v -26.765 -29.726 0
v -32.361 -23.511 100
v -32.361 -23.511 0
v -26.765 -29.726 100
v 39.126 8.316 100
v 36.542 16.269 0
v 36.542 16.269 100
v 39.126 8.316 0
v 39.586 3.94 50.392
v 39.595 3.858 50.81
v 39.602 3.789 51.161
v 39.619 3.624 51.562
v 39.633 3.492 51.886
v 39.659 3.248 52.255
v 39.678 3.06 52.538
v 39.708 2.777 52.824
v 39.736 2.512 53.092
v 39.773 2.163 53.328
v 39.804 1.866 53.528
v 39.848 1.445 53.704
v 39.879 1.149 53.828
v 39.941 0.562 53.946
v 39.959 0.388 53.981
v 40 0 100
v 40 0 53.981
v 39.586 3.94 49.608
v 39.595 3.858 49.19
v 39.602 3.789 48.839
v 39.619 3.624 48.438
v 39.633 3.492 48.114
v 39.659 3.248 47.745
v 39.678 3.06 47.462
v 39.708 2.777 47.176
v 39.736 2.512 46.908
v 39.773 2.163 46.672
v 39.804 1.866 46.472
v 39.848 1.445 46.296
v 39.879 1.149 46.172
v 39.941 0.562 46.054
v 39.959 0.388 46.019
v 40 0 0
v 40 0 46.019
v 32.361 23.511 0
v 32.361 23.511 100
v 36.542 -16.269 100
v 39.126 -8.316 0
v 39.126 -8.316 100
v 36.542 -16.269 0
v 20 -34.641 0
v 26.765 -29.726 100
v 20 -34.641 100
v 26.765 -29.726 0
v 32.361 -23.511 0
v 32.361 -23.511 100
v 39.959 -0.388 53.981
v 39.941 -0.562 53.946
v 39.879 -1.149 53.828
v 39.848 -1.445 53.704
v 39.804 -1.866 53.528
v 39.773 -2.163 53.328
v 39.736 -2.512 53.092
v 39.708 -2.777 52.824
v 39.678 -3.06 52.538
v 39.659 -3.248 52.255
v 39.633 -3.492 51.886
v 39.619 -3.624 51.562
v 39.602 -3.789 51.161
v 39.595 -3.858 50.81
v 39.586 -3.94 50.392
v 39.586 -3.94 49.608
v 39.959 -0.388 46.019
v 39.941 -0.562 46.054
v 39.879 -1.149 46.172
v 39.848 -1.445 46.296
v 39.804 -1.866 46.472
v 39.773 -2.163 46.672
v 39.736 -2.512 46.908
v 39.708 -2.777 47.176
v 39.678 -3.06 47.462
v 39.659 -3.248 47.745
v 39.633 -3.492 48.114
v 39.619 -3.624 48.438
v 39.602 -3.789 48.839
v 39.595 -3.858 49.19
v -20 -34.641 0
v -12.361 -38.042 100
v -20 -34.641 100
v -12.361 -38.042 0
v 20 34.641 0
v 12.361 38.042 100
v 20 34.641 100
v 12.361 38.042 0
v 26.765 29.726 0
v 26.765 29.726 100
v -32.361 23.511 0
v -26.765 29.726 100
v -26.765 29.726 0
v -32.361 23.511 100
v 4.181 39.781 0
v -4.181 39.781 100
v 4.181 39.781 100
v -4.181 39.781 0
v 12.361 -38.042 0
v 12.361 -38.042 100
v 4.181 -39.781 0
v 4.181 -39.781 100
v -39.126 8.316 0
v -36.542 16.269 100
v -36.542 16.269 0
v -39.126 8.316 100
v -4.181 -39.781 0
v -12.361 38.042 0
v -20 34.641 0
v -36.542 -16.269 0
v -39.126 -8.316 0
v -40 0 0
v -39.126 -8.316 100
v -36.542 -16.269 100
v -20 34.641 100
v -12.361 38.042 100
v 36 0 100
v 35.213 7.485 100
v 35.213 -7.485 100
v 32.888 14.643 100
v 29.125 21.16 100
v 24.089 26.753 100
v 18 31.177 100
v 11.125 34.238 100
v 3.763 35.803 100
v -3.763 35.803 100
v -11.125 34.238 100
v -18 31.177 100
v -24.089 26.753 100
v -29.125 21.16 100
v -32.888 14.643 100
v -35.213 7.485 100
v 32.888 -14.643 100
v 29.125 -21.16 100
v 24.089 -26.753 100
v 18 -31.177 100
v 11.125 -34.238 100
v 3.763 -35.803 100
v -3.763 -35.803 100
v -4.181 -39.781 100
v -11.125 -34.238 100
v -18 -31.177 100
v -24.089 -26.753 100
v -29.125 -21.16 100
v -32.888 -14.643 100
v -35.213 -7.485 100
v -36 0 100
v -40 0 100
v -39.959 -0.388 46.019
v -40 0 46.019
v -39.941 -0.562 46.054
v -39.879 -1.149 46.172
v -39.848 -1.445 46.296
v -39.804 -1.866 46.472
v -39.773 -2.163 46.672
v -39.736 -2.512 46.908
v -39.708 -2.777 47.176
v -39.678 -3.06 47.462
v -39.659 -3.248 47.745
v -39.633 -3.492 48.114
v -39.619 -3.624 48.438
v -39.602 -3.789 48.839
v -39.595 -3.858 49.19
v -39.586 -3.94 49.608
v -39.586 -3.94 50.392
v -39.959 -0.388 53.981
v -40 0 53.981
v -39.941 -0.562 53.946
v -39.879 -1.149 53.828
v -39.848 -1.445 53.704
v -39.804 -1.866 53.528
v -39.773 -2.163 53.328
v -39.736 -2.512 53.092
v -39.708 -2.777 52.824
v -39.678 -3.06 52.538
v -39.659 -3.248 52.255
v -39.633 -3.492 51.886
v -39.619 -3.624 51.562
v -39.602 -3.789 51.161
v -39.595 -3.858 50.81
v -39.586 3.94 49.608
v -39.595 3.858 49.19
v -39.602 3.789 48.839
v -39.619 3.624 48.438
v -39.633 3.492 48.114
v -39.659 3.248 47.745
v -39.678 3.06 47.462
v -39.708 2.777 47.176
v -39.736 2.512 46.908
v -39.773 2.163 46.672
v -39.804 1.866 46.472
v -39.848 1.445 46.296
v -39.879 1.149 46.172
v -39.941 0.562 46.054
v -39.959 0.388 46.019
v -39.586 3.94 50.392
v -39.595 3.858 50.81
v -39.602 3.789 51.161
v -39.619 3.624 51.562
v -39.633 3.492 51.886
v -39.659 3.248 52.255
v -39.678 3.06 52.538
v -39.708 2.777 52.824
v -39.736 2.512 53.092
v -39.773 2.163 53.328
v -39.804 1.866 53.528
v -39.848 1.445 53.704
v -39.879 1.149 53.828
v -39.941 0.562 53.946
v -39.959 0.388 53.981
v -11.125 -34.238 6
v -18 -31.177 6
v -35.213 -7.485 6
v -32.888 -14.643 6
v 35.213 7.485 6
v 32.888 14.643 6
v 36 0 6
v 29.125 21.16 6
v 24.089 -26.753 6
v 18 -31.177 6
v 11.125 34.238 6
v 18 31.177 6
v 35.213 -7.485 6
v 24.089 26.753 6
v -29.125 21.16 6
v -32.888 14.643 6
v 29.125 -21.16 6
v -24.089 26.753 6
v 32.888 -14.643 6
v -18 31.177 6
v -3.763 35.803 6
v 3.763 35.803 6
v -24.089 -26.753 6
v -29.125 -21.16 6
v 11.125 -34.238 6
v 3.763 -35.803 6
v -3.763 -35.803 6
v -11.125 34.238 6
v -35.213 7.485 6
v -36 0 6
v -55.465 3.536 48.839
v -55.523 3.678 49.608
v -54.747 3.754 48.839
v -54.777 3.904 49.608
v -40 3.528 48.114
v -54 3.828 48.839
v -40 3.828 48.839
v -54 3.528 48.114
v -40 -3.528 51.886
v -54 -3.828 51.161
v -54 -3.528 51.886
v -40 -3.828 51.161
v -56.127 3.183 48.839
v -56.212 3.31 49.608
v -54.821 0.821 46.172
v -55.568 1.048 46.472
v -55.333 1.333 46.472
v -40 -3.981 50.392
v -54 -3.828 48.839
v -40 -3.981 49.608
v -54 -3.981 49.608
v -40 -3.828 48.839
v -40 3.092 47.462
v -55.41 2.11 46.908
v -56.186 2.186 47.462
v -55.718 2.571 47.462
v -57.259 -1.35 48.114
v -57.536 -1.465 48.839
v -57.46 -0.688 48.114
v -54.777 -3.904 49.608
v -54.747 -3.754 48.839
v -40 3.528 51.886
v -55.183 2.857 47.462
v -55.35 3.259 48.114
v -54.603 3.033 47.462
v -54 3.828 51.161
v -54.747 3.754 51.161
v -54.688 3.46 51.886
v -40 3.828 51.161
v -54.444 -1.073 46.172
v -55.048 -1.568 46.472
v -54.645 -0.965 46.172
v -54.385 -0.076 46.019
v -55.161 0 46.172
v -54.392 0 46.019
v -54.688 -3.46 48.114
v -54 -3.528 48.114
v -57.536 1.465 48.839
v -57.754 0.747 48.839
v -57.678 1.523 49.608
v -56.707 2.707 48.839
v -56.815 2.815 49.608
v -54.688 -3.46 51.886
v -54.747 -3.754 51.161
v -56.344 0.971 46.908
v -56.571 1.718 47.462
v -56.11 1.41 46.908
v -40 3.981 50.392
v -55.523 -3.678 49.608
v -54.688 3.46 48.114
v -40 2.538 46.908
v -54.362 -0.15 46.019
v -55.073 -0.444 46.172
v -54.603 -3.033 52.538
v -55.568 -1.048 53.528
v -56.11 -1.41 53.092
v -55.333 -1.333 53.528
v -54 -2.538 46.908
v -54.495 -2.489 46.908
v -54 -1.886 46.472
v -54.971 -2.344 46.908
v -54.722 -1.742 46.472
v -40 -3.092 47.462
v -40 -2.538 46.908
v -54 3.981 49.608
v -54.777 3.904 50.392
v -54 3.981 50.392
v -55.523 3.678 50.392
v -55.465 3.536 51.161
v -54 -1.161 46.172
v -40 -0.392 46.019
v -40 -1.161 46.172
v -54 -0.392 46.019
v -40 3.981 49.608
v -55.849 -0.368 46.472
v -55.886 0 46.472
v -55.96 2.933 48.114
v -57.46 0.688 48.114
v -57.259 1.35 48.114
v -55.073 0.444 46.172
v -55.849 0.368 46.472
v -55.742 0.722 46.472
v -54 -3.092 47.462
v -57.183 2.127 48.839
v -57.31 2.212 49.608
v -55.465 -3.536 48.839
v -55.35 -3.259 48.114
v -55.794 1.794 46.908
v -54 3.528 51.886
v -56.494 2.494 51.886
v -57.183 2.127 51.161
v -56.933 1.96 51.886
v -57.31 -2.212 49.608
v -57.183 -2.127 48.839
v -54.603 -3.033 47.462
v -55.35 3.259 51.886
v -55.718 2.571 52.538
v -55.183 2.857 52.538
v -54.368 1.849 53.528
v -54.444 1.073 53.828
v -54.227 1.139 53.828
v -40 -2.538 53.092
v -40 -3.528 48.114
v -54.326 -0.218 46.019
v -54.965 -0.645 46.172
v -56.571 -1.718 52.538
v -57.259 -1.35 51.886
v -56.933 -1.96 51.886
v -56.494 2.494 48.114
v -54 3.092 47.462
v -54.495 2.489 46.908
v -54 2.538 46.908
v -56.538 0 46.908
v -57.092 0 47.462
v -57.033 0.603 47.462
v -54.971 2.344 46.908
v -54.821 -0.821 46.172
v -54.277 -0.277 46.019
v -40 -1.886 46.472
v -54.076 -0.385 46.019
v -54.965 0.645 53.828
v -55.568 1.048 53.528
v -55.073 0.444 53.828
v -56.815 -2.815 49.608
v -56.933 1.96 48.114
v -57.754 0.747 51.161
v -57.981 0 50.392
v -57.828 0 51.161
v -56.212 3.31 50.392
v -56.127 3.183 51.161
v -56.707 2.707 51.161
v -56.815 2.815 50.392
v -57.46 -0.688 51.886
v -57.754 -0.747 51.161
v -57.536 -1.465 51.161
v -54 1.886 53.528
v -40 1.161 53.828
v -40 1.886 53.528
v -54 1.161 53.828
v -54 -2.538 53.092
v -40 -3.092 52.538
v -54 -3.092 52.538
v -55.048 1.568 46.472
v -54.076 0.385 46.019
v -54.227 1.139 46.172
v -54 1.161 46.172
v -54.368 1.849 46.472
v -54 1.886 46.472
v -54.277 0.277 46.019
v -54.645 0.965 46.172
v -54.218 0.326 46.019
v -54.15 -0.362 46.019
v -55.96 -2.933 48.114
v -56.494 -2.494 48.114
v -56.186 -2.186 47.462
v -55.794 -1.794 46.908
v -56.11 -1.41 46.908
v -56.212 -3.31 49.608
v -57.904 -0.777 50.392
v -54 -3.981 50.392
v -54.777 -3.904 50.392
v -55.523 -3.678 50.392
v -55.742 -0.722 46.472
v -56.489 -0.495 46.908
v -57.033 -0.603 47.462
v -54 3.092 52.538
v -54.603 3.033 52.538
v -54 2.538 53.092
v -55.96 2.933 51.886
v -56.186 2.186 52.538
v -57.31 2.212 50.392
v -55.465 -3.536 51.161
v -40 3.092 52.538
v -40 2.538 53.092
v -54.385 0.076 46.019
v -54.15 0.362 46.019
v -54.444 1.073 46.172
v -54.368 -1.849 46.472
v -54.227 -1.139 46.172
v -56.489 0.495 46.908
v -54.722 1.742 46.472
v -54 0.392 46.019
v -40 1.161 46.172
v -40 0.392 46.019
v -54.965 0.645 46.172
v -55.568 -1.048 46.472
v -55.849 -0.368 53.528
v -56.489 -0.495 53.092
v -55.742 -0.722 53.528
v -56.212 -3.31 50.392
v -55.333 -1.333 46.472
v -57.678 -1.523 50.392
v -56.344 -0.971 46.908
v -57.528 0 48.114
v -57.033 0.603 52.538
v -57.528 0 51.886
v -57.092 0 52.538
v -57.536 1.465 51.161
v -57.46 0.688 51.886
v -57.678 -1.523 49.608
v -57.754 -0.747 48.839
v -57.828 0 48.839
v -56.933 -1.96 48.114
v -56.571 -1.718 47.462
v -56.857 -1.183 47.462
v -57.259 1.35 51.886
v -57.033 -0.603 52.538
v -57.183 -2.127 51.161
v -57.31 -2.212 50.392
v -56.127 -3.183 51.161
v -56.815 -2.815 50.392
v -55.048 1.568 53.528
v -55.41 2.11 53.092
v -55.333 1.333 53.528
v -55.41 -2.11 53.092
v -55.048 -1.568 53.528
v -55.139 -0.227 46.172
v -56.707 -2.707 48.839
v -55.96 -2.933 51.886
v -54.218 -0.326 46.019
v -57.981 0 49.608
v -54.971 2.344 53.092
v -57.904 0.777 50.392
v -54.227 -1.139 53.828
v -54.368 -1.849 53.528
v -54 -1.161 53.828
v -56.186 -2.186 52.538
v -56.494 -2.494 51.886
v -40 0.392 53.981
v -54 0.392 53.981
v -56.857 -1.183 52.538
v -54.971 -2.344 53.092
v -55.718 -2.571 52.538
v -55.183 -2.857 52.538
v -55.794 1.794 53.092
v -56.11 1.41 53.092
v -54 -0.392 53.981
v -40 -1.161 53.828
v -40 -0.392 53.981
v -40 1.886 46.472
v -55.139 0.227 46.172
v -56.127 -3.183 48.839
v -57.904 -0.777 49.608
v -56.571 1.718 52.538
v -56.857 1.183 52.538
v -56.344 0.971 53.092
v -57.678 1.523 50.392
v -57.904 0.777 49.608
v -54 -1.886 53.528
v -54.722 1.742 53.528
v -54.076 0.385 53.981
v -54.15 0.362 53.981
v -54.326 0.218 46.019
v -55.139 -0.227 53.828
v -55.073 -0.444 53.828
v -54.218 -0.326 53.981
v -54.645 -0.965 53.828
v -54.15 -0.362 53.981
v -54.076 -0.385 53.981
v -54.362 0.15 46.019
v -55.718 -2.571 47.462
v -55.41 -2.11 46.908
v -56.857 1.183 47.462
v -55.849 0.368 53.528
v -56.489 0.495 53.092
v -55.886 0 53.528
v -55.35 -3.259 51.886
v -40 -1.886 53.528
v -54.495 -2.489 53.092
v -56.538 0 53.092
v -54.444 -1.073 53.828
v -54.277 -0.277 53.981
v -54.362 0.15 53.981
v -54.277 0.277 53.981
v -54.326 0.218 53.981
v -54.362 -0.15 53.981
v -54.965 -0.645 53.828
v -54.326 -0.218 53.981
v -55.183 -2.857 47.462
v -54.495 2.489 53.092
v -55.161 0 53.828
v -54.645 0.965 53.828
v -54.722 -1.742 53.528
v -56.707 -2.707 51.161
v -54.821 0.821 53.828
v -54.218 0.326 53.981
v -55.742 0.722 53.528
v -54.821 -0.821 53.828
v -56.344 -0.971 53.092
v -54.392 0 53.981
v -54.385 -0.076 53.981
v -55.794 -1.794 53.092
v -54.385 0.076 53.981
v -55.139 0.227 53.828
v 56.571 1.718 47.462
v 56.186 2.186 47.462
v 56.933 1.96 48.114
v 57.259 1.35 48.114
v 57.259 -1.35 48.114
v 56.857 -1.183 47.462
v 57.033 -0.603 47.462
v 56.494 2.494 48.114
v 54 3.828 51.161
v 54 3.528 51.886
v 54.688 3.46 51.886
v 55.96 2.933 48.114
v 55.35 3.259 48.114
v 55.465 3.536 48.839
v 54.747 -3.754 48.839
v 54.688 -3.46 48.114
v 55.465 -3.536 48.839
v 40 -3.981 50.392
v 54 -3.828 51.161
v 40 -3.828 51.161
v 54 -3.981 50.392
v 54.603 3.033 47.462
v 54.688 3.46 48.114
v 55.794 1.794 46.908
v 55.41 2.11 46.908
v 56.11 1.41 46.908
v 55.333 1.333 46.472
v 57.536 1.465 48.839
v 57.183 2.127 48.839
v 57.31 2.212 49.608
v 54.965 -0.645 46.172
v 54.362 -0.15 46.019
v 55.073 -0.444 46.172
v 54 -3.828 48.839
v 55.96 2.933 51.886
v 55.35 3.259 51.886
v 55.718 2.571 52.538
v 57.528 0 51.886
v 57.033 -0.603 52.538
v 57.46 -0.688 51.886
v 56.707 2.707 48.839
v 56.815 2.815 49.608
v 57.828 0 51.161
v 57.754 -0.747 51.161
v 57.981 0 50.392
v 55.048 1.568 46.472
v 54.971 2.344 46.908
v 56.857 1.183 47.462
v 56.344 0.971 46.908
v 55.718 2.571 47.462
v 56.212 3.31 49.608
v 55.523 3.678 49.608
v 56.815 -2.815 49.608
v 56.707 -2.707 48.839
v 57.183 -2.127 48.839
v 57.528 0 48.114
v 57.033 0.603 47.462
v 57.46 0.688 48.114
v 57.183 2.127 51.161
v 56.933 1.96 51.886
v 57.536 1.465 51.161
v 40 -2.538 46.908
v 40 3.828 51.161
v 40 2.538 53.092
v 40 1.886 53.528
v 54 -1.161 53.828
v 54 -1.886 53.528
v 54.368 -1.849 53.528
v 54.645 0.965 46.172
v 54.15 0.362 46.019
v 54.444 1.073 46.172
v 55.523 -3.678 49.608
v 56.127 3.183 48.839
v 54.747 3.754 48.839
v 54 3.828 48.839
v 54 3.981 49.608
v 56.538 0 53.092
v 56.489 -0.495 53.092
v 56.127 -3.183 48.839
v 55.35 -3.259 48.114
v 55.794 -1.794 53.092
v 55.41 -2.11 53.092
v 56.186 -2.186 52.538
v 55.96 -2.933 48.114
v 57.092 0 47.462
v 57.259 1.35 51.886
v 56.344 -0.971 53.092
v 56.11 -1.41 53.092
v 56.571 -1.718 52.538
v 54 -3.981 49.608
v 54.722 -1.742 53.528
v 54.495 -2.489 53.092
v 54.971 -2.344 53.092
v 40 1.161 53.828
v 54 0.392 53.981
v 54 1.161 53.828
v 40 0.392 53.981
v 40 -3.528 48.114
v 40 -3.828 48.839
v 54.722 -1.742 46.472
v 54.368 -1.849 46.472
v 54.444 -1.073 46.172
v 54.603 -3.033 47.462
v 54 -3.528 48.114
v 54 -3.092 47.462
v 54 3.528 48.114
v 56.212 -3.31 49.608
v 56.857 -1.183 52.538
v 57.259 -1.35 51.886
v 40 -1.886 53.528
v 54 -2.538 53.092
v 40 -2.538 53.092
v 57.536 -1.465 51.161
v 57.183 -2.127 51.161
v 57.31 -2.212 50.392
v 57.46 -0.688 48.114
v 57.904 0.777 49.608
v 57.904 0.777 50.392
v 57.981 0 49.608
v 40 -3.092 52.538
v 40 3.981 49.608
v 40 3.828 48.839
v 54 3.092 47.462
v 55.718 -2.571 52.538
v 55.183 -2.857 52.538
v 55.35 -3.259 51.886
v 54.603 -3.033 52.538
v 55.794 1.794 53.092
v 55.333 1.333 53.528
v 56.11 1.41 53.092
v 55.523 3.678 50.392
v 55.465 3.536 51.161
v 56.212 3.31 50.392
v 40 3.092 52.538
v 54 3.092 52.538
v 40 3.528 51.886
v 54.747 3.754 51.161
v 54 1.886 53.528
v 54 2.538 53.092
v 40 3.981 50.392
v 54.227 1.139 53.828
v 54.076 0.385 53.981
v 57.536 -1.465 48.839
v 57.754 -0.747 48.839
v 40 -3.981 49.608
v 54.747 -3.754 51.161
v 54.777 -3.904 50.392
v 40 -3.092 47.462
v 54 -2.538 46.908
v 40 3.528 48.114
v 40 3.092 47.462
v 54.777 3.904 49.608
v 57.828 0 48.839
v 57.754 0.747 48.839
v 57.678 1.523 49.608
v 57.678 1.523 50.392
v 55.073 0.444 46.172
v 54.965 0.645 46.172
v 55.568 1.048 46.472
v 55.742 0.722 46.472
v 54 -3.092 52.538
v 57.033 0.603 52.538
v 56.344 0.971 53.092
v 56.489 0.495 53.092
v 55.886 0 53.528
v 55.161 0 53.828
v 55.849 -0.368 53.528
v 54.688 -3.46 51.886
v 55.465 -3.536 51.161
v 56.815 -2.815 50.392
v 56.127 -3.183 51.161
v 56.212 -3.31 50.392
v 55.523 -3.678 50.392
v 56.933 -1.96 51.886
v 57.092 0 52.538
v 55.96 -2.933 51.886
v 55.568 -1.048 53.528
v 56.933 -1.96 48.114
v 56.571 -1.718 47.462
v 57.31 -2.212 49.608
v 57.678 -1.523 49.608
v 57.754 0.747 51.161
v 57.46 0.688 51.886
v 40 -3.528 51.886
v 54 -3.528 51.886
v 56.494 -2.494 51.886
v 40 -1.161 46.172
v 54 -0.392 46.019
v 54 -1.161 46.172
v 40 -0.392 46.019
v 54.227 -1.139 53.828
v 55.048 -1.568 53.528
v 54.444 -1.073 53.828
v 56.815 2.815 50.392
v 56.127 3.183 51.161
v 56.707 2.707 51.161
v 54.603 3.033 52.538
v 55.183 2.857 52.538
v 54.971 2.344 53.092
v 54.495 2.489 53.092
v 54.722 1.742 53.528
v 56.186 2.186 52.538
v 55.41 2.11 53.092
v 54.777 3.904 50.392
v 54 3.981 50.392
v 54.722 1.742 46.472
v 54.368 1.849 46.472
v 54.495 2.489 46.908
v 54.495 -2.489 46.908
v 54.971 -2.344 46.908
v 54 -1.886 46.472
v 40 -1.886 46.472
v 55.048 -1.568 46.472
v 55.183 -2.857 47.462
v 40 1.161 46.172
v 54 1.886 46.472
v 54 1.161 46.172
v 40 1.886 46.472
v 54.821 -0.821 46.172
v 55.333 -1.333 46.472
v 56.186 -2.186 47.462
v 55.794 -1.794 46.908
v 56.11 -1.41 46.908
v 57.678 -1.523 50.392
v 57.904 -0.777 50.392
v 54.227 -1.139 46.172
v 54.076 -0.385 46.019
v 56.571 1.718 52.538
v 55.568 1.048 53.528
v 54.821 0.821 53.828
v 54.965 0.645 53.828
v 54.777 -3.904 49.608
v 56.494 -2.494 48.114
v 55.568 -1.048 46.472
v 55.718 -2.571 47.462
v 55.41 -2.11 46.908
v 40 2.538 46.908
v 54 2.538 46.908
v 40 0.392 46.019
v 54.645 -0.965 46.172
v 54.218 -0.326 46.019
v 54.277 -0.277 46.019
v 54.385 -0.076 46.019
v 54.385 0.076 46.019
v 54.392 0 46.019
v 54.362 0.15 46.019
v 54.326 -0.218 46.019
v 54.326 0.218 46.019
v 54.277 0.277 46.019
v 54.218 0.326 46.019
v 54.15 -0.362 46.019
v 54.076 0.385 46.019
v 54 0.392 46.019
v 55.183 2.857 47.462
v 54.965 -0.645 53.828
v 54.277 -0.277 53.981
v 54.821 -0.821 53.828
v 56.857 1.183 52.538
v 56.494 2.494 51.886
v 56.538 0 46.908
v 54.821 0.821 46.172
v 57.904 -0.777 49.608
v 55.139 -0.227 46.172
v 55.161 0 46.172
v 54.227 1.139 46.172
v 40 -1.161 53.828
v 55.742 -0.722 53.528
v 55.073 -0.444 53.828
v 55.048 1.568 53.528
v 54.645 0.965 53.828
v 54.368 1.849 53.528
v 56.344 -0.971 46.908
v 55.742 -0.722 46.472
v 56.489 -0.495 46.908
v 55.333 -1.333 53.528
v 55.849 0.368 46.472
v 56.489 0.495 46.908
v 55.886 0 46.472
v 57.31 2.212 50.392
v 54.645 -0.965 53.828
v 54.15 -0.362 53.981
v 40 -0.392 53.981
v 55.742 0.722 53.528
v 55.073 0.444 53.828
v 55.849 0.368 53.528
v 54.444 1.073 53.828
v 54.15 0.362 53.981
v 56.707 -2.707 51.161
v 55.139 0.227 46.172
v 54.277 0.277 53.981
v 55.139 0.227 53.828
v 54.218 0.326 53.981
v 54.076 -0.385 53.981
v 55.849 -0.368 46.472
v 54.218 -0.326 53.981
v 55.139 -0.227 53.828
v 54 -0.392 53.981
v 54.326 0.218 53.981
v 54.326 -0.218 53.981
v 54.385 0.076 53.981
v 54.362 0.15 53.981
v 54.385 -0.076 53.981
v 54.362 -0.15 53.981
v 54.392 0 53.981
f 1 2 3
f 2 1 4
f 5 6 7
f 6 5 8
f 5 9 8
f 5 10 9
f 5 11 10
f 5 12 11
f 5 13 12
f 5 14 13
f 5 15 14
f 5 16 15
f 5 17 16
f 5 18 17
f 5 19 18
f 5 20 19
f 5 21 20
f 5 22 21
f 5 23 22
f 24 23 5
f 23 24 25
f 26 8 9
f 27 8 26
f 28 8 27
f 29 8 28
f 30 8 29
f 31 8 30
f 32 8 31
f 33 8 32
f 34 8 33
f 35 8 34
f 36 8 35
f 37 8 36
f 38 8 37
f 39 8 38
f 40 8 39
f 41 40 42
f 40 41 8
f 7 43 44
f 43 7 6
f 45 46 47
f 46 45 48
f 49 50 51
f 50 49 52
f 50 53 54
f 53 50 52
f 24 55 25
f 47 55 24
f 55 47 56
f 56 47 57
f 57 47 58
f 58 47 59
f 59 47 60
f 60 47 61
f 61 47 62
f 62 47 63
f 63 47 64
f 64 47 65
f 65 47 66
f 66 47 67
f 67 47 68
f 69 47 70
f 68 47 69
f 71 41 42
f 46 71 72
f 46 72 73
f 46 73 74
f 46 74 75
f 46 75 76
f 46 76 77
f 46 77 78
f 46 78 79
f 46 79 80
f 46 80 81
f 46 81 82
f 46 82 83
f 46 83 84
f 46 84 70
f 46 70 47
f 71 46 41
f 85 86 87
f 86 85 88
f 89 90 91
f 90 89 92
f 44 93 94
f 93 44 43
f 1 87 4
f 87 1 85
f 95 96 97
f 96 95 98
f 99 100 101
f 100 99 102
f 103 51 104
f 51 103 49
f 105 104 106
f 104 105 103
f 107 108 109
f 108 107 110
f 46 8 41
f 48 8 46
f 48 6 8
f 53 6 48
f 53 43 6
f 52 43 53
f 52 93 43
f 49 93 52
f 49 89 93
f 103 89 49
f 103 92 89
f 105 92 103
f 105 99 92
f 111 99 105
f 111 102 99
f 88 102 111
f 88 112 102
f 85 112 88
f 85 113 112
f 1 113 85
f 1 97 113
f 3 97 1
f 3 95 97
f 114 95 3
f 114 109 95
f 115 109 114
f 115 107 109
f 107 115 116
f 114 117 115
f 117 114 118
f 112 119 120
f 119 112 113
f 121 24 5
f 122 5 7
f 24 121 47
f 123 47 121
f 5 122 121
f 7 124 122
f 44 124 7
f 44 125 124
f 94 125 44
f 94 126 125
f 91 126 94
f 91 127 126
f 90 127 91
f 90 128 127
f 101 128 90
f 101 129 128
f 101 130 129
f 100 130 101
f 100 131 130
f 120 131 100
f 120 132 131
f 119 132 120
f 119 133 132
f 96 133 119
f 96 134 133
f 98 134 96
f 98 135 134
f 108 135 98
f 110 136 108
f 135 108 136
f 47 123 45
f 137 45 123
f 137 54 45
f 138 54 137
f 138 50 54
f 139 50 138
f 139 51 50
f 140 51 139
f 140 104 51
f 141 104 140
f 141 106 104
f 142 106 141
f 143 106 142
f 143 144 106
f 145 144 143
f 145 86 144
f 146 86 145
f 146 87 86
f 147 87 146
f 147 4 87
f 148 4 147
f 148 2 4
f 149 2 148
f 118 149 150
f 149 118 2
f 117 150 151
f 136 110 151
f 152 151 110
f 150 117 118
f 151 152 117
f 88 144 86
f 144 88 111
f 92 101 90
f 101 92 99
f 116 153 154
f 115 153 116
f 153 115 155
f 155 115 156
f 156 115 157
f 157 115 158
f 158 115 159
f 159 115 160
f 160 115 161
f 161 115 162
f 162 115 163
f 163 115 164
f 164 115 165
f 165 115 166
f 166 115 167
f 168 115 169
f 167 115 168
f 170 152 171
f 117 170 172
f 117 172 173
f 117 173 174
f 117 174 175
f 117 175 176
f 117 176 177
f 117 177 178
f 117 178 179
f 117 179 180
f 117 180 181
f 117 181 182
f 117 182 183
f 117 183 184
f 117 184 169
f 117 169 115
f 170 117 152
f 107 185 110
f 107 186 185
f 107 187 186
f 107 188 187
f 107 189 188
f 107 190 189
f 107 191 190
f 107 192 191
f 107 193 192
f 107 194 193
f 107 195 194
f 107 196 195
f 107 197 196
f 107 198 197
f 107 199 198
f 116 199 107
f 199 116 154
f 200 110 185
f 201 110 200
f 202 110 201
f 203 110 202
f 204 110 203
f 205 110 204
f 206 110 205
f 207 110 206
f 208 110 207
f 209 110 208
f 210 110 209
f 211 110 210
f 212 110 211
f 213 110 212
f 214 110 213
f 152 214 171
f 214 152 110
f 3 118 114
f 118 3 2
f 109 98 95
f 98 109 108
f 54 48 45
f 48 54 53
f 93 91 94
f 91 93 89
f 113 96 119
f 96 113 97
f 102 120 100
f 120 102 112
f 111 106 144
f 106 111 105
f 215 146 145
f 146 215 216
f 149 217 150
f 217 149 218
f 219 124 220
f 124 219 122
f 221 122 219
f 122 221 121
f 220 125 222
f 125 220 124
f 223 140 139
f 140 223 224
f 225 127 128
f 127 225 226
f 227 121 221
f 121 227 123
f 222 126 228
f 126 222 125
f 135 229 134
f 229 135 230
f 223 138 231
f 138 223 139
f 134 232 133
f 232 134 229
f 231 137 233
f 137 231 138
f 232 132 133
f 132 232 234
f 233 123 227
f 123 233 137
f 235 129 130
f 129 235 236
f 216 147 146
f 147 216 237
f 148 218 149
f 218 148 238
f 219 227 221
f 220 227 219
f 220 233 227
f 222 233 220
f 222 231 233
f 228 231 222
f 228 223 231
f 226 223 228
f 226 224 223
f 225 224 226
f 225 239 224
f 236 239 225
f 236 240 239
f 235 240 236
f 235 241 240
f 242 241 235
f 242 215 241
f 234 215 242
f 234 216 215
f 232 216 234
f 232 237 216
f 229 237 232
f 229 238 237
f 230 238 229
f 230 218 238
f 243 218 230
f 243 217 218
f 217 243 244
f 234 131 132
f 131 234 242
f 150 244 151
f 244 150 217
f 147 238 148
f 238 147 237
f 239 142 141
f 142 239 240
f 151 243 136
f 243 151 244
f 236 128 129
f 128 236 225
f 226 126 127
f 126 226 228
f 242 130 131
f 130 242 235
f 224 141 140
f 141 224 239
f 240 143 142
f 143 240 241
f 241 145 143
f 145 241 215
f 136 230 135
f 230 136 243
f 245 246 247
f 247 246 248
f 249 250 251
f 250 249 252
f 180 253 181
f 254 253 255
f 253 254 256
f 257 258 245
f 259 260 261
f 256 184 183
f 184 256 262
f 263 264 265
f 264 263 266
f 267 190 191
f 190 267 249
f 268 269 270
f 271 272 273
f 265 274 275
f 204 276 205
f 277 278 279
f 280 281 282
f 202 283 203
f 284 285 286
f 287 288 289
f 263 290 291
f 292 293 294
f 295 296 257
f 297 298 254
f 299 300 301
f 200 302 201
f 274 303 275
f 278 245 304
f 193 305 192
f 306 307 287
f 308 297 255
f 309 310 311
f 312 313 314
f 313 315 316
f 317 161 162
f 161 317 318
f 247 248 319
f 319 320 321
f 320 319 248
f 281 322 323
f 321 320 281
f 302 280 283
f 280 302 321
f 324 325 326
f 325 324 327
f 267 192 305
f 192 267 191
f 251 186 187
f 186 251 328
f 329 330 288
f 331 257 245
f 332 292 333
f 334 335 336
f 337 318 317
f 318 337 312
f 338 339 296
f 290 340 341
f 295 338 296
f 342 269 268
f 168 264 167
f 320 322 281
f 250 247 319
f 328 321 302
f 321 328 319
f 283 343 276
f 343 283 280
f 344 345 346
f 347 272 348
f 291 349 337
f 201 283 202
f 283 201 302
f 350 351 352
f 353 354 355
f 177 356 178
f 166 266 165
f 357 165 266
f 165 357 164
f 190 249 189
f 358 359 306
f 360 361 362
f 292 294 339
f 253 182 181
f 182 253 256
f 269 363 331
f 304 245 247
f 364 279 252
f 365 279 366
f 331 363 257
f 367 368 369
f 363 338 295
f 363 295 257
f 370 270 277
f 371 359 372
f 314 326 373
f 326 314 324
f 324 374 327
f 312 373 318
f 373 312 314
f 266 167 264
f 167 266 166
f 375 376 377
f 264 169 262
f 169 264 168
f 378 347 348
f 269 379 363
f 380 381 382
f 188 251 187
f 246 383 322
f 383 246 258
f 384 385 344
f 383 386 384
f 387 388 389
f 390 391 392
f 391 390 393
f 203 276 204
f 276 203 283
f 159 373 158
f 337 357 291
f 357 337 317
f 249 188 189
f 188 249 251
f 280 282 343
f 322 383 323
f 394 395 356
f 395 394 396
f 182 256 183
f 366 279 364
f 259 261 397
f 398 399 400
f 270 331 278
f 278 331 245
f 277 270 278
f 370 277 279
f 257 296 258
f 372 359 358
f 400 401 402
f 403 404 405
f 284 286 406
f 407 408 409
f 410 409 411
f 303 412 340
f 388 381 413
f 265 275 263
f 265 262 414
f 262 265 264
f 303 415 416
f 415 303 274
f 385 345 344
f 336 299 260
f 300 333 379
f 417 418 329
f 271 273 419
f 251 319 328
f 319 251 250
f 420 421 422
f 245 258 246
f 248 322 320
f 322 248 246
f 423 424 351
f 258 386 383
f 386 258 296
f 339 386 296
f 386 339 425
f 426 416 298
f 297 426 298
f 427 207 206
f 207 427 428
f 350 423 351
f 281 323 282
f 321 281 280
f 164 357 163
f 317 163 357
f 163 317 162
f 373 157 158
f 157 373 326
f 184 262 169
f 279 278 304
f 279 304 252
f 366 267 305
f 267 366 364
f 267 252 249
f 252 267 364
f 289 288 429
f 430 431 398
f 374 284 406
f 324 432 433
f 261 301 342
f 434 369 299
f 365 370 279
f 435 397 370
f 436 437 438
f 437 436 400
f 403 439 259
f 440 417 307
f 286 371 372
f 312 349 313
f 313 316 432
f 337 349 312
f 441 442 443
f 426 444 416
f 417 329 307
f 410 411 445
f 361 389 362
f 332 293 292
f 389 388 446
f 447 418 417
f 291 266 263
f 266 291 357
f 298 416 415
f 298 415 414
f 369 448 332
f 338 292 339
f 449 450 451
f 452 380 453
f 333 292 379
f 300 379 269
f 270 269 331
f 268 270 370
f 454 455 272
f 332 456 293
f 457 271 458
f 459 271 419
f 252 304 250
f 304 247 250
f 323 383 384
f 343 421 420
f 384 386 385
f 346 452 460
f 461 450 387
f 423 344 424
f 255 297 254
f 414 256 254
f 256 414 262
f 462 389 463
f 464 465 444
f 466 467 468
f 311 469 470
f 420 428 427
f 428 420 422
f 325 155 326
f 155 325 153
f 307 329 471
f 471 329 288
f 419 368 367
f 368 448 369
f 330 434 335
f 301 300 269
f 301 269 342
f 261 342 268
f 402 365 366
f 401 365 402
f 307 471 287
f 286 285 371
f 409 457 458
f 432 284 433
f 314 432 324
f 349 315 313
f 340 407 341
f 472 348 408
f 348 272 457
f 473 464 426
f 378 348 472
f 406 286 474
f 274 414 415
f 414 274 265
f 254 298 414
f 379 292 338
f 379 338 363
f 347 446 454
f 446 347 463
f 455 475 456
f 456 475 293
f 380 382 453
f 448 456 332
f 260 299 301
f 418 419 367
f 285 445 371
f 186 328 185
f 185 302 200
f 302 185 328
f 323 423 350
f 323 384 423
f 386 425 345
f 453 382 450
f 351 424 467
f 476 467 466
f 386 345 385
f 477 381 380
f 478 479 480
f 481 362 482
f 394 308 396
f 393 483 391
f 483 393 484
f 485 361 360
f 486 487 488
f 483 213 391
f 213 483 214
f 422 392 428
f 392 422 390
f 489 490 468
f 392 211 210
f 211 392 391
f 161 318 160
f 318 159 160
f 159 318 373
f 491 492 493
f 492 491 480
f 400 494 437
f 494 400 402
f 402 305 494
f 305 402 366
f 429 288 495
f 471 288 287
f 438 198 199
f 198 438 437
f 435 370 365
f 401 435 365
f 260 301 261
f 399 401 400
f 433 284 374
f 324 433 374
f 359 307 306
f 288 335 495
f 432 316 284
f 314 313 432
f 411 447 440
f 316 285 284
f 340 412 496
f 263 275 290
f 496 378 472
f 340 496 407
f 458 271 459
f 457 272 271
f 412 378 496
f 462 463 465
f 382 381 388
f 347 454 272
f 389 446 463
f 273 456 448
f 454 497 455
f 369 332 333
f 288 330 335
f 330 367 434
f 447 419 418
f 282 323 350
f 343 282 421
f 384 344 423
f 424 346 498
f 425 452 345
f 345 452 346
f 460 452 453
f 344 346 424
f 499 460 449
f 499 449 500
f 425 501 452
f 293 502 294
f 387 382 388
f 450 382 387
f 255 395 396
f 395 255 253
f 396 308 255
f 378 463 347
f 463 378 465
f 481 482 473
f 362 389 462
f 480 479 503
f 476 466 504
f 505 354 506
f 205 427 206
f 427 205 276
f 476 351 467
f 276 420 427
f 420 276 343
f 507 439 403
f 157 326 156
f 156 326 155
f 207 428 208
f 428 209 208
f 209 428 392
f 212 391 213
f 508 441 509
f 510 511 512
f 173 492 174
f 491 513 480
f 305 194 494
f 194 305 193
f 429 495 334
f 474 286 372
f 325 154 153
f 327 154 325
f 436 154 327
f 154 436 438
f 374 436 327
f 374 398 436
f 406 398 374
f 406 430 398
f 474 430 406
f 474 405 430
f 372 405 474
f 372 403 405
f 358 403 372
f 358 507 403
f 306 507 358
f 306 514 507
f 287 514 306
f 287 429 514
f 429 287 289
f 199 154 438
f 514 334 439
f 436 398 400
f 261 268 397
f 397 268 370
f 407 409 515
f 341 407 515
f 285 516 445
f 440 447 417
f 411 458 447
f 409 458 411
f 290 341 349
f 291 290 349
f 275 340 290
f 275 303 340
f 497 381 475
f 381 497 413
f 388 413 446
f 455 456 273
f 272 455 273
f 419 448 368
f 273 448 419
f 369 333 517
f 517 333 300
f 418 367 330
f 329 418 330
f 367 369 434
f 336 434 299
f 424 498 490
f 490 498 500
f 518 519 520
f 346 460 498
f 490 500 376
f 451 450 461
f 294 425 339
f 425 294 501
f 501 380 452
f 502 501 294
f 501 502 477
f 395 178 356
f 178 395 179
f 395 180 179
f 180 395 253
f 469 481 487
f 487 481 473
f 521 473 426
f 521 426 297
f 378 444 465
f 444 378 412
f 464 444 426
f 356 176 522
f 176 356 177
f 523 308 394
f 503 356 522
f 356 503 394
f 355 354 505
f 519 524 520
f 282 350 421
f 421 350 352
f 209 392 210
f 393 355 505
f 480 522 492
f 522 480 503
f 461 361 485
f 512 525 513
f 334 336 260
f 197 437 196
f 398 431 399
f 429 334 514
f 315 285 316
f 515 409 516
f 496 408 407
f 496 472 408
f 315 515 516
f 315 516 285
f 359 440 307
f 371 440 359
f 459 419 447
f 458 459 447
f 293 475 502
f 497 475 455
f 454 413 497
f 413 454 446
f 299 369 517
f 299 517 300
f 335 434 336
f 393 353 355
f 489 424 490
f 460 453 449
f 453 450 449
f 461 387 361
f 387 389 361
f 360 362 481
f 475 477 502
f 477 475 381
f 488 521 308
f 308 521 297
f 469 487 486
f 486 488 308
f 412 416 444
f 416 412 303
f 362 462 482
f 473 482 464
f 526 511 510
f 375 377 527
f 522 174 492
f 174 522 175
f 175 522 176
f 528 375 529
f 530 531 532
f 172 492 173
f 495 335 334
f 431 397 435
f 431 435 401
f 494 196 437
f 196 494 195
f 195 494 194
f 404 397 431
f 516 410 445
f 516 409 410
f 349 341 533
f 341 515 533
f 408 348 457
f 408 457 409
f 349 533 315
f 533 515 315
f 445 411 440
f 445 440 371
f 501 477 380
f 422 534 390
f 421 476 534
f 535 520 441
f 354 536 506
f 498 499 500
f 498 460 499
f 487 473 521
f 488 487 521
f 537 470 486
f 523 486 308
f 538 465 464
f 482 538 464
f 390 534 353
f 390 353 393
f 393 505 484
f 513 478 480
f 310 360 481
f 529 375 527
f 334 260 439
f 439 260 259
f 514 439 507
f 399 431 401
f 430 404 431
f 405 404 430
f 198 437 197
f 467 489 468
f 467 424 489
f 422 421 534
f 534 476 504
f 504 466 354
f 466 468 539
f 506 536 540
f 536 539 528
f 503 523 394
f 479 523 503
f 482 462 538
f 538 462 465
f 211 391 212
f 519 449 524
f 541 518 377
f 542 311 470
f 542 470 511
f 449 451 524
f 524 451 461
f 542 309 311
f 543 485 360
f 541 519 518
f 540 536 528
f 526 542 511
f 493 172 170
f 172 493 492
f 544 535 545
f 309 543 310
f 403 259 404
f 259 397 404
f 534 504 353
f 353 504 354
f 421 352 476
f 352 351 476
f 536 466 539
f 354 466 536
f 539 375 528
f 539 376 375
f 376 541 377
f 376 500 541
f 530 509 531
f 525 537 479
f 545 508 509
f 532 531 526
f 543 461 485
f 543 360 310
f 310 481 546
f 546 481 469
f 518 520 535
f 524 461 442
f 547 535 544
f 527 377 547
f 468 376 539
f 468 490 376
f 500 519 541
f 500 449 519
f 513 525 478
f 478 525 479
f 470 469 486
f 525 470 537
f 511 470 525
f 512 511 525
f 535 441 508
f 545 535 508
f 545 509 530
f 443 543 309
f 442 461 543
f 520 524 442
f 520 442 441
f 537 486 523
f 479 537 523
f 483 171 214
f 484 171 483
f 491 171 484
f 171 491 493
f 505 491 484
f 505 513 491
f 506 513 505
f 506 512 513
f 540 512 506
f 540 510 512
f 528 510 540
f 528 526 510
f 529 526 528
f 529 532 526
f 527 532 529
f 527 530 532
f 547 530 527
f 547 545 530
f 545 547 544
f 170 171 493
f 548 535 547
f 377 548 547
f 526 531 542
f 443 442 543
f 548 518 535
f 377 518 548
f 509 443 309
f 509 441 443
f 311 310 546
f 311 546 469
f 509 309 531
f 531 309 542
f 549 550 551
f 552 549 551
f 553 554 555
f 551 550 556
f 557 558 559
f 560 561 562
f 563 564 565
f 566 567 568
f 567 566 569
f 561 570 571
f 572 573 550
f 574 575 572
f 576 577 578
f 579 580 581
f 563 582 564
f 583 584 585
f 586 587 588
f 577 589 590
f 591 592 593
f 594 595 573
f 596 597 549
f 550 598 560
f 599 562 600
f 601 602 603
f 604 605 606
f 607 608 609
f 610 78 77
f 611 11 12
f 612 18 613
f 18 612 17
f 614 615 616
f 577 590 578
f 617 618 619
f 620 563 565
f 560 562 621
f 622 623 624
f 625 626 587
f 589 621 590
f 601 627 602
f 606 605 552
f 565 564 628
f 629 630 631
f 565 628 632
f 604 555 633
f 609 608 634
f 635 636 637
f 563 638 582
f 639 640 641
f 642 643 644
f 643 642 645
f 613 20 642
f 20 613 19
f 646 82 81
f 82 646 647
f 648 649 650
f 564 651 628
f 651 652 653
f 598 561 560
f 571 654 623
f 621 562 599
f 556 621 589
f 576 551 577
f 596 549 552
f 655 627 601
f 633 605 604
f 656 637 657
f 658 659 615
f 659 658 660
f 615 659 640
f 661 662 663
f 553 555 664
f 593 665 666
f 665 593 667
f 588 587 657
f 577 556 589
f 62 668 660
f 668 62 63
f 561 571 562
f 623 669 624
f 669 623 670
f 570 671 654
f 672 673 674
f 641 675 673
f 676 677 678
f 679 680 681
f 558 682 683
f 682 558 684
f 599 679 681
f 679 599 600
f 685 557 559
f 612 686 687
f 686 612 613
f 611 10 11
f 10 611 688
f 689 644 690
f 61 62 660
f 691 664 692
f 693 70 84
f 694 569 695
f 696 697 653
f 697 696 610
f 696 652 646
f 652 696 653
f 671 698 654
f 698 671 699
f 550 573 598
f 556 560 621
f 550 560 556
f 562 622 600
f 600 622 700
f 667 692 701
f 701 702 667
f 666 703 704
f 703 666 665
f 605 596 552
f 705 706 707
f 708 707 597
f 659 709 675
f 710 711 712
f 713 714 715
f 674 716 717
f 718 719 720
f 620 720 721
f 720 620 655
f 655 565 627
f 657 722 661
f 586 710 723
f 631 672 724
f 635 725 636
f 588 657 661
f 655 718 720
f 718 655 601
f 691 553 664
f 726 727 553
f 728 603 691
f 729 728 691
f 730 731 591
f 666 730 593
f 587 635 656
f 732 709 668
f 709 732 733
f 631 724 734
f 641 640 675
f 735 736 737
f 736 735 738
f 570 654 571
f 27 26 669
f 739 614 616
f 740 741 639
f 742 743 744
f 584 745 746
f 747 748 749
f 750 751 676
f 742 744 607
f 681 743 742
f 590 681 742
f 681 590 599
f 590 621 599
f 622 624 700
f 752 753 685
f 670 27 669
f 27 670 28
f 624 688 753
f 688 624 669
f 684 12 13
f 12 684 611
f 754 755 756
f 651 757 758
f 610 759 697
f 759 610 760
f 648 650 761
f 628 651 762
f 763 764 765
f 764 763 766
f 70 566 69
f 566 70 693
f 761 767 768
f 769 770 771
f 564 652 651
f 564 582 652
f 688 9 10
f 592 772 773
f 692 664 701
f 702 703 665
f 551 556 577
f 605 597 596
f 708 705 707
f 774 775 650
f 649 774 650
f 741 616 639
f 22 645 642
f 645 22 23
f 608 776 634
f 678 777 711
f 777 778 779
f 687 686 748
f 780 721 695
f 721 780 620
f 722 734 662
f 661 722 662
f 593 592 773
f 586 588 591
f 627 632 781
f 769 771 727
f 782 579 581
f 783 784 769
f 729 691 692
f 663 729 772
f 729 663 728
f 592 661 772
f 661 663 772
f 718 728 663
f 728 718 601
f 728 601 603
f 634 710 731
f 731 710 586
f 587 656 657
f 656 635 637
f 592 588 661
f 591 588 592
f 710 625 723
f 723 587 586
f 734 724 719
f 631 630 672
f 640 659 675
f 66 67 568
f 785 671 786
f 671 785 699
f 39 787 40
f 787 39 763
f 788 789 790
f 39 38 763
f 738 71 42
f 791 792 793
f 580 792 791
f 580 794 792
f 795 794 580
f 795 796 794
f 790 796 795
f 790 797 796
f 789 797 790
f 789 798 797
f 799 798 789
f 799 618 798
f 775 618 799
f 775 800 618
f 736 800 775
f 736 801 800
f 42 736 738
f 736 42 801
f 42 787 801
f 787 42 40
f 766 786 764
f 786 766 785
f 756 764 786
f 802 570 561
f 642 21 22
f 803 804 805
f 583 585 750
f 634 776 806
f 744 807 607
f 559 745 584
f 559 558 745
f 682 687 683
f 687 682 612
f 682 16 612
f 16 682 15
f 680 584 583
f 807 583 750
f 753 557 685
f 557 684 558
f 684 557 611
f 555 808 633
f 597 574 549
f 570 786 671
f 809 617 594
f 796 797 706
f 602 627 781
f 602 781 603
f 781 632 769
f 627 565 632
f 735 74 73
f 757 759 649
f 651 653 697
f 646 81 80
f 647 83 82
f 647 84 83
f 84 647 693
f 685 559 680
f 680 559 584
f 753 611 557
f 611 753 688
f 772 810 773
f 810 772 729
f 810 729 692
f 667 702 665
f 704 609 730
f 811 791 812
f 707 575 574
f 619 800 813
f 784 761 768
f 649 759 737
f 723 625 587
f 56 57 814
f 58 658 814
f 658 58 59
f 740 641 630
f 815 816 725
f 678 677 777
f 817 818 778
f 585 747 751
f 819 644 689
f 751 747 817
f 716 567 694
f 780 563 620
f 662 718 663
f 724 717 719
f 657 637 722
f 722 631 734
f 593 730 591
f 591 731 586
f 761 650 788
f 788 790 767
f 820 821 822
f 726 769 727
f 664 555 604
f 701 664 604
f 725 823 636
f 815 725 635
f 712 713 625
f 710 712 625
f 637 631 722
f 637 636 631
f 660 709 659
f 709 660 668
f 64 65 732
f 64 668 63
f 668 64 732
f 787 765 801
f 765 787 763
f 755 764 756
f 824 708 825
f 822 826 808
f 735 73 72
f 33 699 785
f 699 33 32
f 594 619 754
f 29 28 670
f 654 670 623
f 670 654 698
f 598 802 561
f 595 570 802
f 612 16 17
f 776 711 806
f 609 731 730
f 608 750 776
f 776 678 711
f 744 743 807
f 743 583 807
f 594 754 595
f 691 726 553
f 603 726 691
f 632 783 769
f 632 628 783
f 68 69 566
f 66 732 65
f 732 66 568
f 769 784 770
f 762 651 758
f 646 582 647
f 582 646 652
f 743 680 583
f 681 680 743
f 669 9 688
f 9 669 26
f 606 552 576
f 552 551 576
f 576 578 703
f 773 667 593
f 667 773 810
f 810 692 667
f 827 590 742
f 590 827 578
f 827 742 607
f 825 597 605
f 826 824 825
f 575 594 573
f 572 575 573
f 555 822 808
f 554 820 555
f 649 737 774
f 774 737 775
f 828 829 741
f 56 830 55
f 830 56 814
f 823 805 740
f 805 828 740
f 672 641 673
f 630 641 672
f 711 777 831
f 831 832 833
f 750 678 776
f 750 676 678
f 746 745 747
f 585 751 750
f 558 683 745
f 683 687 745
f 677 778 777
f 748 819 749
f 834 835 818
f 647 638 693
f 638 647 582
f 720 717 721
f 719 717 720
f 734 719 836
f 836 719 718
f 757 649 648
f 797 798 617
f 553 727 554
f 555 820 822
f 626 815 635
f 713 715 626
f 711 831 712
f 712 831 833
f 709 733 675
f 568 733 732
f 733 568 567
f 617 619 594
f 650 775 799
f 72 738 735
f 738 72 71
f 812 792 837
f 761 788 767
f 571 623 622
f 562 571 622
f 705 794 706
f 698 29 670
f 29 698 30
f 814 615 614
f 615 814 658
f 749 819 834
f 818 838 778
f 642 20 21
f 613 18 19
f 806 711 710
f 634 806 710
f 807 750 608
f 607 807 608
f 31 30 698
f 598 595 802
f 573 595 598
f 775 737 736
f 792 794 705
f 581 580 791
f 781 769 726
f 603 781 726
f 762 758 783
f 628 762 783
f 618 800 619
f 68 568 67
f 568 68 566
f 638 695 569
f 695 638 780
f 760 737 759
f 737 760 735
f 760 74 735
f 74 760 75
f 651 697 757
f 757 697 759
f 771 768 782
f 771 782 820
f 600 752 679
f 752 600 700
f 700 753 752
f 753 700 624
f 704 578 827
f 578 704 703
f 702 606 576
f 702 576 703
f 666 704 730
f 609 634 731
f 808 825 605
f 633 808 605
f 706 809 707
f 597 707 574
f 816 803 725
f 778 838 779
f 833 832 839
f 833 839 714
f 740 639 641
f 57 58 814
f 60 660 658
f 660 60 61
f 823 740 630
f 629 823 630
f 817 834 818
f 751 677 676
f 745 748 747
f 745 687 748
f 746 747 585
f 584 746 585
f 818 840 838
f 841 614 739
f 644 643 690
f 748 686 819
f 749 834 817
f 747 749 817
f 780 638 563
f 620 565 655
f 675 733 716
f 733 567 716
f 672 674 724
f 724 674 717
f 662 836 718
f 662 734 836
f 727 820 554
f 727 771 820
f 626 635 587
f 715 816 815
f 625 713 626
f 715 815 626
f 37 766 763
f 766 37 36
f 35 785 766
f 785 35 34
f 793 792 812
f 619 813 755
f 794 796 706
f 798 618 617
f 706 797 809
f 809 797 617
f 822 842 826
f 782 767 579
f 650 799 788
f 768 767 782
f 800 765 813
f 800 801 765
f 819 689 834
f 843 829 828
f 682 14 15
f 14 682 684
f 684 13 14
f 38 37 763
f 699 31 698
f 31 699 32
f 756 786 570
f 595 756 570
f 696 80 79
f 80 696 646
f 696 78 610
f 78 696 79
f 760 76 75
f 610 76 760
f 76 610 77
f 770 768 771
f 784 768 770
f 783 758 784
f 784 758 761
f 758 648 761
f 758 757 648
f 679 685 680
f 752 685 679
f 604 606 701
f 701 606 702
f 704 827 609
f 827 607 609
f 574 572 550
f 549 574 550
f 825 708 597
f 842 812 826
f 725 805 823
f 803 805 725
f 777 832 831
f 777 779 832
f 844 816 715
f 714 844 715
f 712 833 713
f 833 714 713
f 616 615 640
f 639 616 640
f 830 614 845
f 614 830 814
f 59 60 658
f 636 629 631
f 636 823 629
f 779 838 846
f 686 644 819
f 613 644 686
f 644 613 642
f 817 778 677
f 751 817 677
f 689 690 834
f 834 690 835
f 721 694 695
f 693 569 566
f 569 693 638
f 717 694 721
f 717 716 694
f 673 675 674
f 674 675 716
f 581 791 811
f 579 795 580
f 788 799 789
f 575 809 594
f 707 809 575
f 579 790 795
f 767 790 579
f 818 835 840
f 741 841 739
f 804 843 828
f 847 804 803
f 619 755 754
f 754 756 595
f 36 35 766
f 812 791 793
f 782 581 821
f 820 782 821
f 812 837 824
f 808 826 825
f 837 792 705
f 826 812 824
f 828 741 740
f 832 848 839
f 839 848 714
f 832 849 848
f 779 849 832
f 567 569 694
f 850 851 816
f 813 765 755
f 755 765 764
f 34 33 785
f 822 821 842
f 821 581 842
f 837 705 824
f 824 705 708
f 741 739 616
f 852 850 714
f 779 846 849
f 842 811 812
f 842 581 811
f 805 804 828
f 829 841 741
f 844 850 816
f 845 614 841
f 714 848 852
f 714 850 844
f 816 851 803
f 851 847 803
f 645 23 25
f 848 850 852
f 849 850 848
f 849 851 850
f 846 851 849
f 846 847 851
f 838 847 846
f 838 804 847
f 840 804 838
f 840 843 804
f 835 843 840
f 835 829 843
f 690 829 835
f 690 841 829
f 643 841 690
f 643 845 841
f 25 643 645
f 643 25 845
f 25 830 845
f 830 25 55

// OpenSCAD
// マグカップの基本パラメータ
outer_diameter = 80; // 外径 (mm)
height = 100;       // 高さ (mm)
wall_thickness = 4; // 側面肉厚 (mm)
base_thickness = 6; // 底面厚み (mm)

// 内径の計算
inner_diameter = outer_diameter - 2 * wall_thickness;
inner_radius = inner_diameter / 2;
outer_radius = outer_diameter / 2;

// マグカップ本体の作成
module mug_body() {
    difference() {
        // 外側の円筒
        cylinder(h = height, d = outer_diameter, center = false);

        // 内側のくり抜き
        translate([0, 0, base_thickness]) {
            cylinder(h = height - base_thickness, d = inner_diameter, center = false);
        }
    }
}

// 取手のパラメータ
handle_ring_outer_projection = 12; // カップ外壁からの取手のリング外側の飛び出し量
handle_ring_thickness = 4;    // 取手のリングの太さ
handle_finger_hole_diameter = 30; // 指が入るサイズ (内径)
handle_height_center = height / 2; // 取手を付ける中心高さ

// 取手のリングの形状
module handle_ring() {
    // 取手のリングの外側の半径
    handle_ring_outer_radius = outer_radius + handle_ring_outer_projection;

    // 取手のリングの円周方向の中心半径
    handle_ring_center_radius = handle_ring_outer_radius - handle_ring_thickness / 2;

    rotate([90, 0, 0]) { // Z軸周りに90度回転して横向きにする
        translate([handle_ring_center_radius, 0, handle_height_center]) {
            // toroidal shape
            rotate_extrude(convexity = 10) {
                translate([handle_ring_thickness / 2, 0, 0]) {
                    circle(r = handle_ring_thickness / 2, $fn = 64);
                }
            }
        }
    }
}

// 取手の接続部分 (カップ本体と取手のリングを繋ぐ)
module handle_connectors() {
    handle_ring_thickness = 4;
    handle_height_center = height / 2;
    handle_outer_projection = 12; // カップ外壁からの取手のリング外側の飛び出し量

    // 取手のリングの円周方向の中心半径
    handle_ring_center_radius = outer_radius + handle_outer_projection + handle_ring_thickness / 2;

    // 取手の接続部分（カップ本体と取手のリングを繋ぐ）
    // 左側の接続
    hull() {
        // 取手のリングの左端（回転後の位置を考慮）
        translate([-(handle_ring_center_radius), 0, handle_height_center]) {
            sphere(r = handle_ring_thickness, $fn = 32);
        }
        // カップ本体の左側円周上の点
        translate([-outer_radius, 0, handle_height_center]) {
            sphere(r = handle_ring_thickness, $fn = 32);
        }
    }
    // 右側の接続
    hull() {
        // 取手のリングの右端（回転後の位置を考慮）
        translate([handle_ring_center_radius, 0, handle_height_center]) {
            sphere(r = handle_ring_thickness, $fn = 32);
        }
        // カップ本体の右側円周上の点
        translate([outer_radius, 0, handle_height_center]) {
            sphere(r = handle_ring_thickness, $fn = 32);
        }
    }
}

// マグカップ全体を結合
union() {
    mug_body();
    handle_ring();
    handle_connectors();
}
